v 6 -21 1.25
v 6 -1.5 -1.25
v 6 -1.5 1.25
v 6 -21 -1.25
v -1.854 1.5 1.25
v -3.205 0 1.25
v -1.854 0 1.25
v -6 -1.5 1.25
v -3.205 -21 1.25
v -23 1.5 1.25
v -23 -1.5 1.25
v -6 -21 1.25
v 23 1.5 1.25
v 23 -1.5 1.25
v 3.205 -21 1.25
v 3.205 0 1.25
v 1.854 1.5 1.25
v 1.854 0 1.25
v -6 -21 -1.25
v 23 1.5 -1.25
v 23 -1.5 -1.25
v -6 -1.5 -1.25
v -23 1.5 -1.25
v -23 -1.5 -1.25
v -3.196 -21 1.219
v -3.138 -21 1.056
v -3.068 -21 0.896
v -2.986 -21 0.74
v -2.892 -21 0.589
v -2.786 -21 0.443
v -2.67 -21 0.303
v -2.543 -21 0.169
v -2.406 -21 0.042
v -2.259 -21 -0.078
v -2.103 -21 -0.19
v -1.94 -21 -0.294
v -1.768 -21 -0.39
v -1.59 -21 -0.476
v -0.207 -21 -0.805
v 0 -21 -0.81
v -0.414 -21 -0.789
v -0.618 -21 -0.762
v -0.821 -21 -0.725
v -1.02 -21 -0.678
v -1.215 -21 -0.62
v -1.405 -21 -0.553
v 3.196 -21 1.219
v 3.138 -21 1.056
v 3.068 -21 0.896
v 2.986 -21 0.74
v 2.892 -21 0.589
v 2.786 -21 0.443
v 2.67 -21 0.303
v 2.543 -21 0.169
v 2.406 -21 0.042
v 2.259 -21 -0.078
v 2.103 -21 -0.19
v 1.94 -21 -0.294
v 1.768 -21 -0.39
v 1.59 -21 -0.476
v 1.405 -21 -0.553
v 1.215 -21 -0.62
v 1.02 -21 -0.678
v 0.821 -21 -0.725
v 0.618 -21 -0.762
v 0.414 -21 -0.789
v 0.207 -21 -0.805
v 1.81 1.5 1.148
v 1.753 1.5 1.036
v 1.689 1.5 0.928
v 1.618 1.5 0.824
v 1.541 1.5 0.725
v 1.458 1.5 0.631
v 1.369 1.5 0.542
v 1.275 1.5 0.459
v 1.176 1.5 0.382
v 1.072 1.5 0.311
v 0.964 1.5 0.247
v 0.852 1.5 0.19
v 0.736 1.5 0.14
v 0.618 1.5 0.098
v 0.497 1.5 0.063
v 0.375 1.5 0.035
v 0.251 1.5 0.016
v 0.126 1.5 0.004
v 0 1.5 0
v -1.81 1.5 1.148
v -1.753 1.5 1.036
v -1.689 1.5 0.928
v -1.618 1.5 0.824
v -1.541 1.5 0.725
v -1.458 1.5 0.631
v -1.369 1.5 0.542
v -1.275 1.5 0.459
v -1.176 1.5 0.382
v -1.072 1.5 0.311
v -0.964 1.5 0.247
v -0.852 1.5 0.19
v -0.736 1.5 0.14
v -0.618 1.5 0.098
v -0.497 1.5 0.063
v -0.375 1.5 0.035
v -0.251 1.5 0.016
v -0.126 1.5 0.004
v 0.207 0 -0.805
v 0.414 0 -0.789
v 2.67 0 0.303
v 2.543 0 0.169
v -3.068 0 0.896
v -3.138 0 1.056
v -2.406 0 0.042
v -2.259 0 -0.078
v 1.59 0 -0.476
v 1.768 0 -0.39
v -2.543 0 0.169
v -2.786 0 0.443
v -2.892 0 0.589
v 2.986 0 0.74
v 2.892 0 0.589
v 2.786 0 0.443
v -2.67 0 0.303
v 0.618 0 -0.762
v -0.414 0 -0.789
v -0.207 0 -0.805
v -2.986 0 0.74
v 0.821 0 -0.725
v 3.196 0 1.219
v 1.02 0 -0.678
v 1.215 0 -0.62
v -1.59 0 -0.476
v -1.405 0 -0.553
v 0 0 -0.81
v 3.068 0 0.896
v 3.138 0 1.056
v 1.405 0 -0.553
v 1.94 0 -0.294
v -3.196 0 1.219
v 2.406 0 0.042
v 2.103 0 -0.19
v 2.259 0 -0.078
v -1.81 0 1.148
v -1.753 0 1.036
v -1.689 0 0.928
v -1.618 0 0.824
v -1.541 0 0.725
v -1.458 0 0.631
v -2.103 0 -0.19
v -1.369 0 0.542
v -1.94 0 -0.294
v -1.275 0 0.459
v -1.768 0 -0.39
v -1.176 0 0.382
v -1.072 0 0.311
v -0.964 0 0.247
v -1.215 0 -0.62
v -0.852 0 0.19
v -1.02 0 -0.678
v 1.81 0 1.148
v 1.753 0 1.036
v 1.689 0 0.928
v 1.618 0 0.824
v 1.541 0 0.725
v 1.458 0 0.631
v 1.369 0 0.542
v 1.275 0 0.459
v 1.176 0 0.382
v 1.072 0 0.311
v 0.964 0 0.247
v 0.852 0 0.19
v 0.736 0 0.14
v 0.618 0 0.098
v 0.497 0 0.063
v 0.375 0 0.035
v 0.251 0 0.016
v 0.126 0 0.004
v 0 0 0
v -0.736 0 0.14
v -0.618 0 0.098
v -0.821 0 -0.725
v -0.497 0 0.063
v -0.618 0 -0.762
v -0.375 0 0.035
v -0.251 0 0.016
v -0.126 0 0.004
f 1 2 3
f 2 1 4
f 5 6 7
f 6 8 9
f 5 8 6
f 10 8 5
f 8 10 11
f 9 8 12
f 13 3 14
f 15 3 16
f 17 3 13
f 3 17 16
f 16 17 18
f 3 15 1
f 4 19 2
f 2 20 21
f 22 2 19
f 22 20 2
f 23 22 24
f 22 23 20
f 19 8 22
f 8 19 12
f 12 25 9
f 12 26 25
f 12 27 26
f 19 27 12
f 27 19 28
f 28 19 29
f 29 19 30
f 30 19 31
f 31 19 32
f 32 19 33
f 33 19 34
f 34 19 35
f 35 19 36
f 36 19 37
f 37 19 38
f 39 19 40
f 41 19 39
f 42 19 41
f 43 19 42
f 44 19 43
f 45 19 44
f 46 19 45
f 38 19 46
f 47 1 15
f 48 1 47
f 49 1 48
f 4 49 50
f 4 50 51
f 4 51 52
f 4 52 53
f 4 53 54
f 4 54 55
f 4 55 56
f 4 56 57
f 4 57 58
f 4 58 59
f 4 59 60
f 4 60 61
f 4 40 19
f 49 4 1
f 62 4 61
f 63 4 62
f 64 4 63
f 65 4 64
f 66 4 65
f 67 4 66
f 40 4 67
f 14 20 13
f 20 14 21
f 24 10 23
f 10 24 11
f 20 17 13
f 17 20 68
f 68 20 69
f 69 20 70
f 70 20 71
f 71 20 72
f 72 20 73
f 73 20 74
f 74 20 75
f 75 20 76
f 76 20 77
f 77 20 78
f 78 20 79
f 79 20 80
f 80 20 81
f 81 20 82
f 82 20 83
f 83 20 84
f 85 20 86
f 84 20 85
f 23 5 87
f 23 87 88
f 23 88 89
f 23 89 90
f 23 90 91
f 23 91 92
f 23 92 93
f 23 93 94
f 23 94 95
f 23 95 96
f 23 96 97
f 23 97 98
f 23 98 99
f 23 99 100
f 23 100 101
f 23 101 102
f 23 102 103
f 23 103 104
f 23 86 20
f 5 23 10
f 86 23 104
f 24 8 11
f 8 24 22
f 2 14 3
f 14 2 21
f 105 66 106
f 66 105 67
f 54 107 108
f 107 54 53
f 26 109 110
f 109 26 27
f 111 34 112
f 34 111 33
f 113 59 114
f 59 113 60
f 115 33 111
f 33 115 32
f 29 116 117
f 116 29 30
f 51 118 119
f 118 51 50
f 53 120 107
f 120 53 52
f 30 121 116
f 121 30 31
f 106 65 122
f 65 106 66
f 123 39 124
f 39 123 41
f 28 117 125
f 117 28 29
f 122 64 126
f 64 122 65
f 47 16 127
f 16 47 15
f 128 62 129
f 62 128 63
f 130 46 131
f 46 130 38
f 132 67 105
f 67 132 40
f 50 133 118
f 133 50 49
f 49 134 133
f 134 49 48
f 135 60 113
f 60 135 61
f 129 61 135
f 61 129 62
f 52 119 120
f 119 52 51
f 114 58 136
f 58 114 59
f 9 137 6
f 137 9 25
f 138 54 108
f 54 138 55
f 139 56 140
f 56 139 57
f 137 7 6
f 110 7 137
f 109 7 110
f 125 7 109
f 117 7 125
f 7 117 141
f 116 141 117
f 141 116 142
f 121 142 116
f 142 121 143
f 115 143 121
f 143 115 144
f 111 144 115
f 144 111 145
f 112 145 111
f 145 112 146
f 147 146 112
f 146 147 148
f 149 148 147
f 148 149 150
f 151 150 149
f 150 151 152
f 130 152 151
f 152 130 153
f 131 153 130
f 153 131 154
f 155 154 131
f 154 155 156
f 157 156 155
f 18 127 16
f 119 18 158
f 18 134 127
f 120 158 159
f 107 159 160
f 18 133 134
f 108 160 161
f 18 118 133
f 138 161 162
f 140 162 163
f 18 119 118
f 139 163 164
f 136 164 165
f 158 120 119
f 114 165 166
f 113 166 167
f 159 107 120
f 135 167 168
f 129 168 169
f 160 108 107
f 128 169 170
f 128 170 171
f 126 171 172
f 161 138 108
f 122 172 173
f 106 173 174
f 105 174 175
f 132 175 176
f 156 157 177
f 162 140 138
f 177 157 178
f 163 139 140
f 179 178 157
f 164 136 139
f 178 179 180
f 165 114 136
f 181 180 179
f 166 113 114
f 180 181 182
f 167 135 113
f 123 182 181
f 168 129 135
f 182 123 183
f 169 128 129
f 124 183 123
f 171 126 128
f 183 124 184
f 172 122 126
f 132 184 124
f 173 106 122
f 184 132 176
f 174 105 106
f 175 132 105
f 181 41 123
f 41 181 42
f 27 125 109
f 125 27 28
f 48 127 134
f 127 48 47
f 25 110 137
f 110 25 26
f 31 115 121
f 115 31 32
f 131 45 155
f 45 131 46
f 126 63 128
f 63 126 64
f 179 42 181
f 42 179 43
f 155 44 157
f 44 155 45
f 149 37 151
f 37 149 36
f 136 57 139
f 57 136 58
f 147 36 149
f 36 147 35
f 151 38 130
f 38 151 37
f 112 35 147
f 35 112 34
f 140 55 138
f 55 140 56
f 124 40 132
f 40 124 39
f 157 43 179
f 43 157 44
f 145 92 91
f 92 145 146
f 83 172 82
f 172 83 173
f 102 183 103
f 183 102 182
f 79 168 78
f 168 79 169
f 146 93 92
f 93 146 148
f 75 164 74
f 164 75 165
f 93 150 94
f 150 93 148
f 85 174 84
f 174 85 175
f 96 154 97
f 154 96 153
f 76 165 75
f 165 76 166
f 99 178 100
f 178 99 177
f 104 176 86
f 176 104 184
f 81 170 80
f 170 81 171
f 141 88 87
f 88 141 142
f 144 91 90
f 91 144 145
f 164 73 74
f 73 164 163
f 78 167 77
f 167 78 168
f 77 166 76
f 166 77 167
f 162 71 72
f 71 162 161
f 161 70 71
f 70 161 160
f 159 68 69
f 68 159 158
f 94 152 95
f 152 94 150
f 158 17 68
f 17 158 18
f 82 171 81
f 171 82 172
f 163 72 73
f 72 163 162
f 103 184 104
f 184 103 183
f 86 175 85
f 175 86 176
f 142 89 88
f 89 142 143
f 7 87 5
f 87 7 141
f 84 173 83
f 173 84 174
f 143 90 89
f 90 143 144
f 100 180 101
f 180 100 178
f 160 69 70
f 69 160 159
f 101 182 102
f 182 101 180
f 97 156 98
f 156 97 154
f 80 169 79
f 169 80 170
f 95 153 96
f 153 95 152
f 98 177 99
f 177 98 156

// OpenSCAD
// frame for home cage alcohol self-administration. 
// Hao Chen
// UTHSC
// Creative Commoons Attribution NonCommercial  

$fn=100;
max_w=210;
max_h=138;
max_d=90;

pw=40;// spout holder width x 
ph=45;// spout holder length y
pg=60;// spout holder height z
//r=10;
fv=0.1; // for better visualization

module corner(ln=20, wd=30 ){ // a negative part for making a round corner 
	difference (){
		cube([wd,wd,ln]);
		translate([0,0,0])
		cylinder(r=wd, h=ln);
	}
}

module outbox(){ // outside box for the frame
	corner_wd=10;
	corner_ln=max_d;
	difference(){
		cube([max_w-fv,max_d-fv,max_h-fv],center=true);
		union(){
			translate([max_w/2-corner_wd, max_d/2, -max_h/2+corner_wd]) rotate([90,90,0]) corner(ln=corner_ln, wd=corner_wd);
			translate([-max_w/2+corner_wd, max_d/2, -max_h/2+corner_wd]) rotate([90,180,0]) corner(ln=corner_ln, wd=corner_wd);
		}
	}
}

module innerbox(){ // inside box for the frame
	inn_w=max_w-10;
	inn_h=max_h-20;
	inn_d=max_d;
	corner_wd=20;
	corner_ln=max_d;
	difference(){
		cube([inn_w-fv,inn_d-fv,inn_h-fv],center=true);
		union(){
			translate([inn_w/2-corner_wd, inn_d/2, -inn_h/2+corner_wd]) rotate([90,90,0]) corner(ln=corner_ln, wd=corner_wd);
			translate([-inn_w/2+corner_wd, inn_d/2, -inn_h/2+corner_wd]) rotate([90,180,0]) corner(ln=corner_ln, wd=corner_wd);
		}
	}
}

module frame(){
	difference () {
		outbox();
		translate([0,4,-max_h/2]) cube([max_w-20,max_d-7,max_h/2], center=true);
		translate([0,7,-8]) innerbox();
	}
}

module mounting_m25(innR=1.9){ // screw 
	difference(){
		cylinder(r=3.8, h=5);
		cylinder(r=innR, h=5+fv);
	}
}

module mounting_pi(){
	mounting_m25();
	translate([58,0,0]) mounting_m25();
	translate([0,49,0]) mounting_m25();
	translate([58,49,0]) mounting_m25();
} 

module mounting_touch(){
	mounting_m25(innR=1.2);
	translate([28,0,0]) mounting_m25(innR=1.2);
} 

module mounting_RTC(){
	mounting_m25();
	difference(){
		union(){
			translate([22.5,0,0]) cylinder(r=3.8, h=5);
			translate([24.5,0,0]) cylinder(r=3.8, h=5) ;
		}
		translate([22.5,0,0]) cylinder(r=1.2, h=10);
		translate([24.5,0,0]) cylinder(r=1.2, h=10); 
	}
}

module mounting_screws(){
	translate([-92,-17, max_h/2-2]) mounting_pi();
	translate([8,-16, max_h/2-2]) mounting_touch();
	translate([20,33, max_h/2-2]) mounting_RTC();
	translate([70,-20, max_h/2+2]) rotate([0,0,0])  step_motor_control();
}



module top_groove(){ // for the top cover
	xw=max_w-5;
	xd=max_d-5;
	difference(){
		union (){
	//		translate([xw/2-.5, xd/2-.5,-5]) corner2();
	//		translate([-xw/2+0.5, -xd/2+0.5,-5]) corner2() ;
	//		translate([-xw/2+0.5, xd/2-0.5,-5]) corner2() ;
	//		translate([xw/2-0.5, -xd/2+0.5,-5]) corner2() ;
			cube([xw, xd, 10], center=true);
		}
		translate([0,0, -5.6])round_corner_box(r0=5, wd=max_w-24, lg=max_d-24,ht=11);
	}
}

//module corner2(){
	//rotate([0,0,45]) scale([0.7,1,1]) cylinder(r=1.5	,h=10);
//	 cylinder(r=1.5	,h=10);
//}

module lcd(){ // model:  HD44780 
	translate([0,0, 13.1]) cube([71.5, 24.5, 8.4], center=true);
	//translate([0,0, 13.1-3.7]) cube([80.6, 36, 0.1], center=true); // base plate
}

module lcd_screw(){
	difference(){
	cylinder(r=3.4, h=10);
	cylinder(r=1.3,, h=10);
	}
}


module lcd_mounting(){
	w=75;
	l=31;
	translate([w/2,   l/2,0])lcd_screw();
	translate([w/2,  -l/2,0])lcd_screw();
	translate([-w/2, -l/2,0])lcd_screw();
	translate([-w/2,  l/2,0])lcd_screw();
}

module rfid_antenna_holder(){
	difference(){
		cube([10,20,19], center=true);
		translate([1,0,5]) cube([8,22,19], center=true);
	}
}

module top_cover(){
	lcdx=-40;
	lcdy=17;
	lcdz1=51;
	lcdz2=43;
	ctlx=30;
	ctly=41;
	ctlz=20;
   union(){
		translate([-105,22,48.5]) rfid_antenna_holder(); //box on side to hold antennae
		difference(){  
			translate([0,40,0]) rotate([90,0,270]) slant_box(); //outside
			difference() {
				translate([0,38,-2]) rotate([90,0,270]) scale([0.95, 1, 0.98]) slant_box(); //inside    
				translate([ctlx,ctly,ctlz]) rotate([90,0,0]) drill(); // for controlPanel
				translate([lcdx,lcdy,lcdz1]) lcd_mounting();
		}
		translate([-130,0,4]) rotate([0,90,0]) cylinder(r=1.9, h=240); //screw hole for the top cover on the side;
		//translate([max_w/2-10,0,16]) rotate([90,0,90]) round_corner_box(r0=1, wd=28,lg=2.5, ht=20); // sd card slot for old base
		translate([max_w/2-10,-5,11]) rotate([90,0,90]) round_corner_box(r0=1, wd=14.5,lg=2.5, ht=20); // sd card slot for updated base
		translate([5,max_d/2,6]) rotate([90,0,0]) round_corner_box(r0=1, wd=30,lg=10, ht=15); // new, longer wire exits 
		translate([-max_w/2+5,-14,-1]) round_corner_box(r0=0.5, wd=5,lg=1, ht=10); // side exit for antennae
		translate([ctlx,ctly,ctlz]) rotate([90,0,0]) controlPanel();
		translate([lcdx,lcdy,lcdz2]) rotate([0,0,0]) lcd();
//#		translate([lcdx,lcdy,lcdz2]) rotate([0,0,0]) lcd_mounting_neg();
		}
	}
}

module slant_box() {
	linear_extrude(height=max_w-8,center=true) polygon(points=[[0,0],[0,58],[55,58],[max_d-9,29],[max_d-9,0]]);
}

module switch() { //holes for the switch buttons
    translate([11,23,0]) cube([8,7,7]);
    translate([29,23,0]) cube([8,7,7]);
}

module led() { // hole for the LED lights
   translate([19,0,0]) cube([10,5,7]);
}

module column(){
 	cylinder(2.5,4,4);
} //the inside column

module drill() {//all four inside columns
    translate([4,4,2.23]) column();
    translate([44,4,2.23]) column();
    translate([4,26,2.23]) column();
    translate([44,26,2.23]) column();
}

module hollow() {
	cylinder(9.1,1.5,1.5);
} //the screw holes

module drillholes() {//all four screw holes for switches board
	//translate([4,4,0]) hollow();
    //translate([44,4,0]) hollow();
   	translate([4,26,0]) hollow();
   	translate([44,26,0]) hollow();
}
module controlPanel() {  //holes for the screws, LED, and buttons
	union() {
		switch();
		led();
		drillholes();
	}
}


module round_corner_box( r0=10, wd=20, ht=30, lg=40) { // generic 
	hull(){
	translate([wd/2,lg/2,0])
	cylinder(r=r0, h=ht);
	translate([wd/2,-lg/2,0]) cylinder(r=r0, h=ht);
	translate([-wd/2,-lg/2,0]) cylinder(r=r0,h=ht);
	translate([-wd/2,lg/2,0]) cylinder(r=r0, h=ht);
	}
}

module step_motor_control(){
	difference(){
		cube([22+20, 17+4, 5],center=true);
		union(){
			translate([15,0,-3]) cylinder(r=1.5, h=8);
			translate([-15,0,-3]) cylinder(r=1.5, h=8);
			cube([22, 17, 9], center=true);
		}
	}

} 

module step_motor_fastener (){
	difference(){
		cube([13, 9, 3],center=true);
		translate([4,0,-3]) cylinder(r=1.7, h=8);
	}
}

module motion_sensor (){
	translate([-14,0,5]) cylinder(r=1, h=7);
	translate([14,0,5]) cylinder(r=1,h=7);
	cylinder(r=4.5, h=20);
	cylinder(r1=20,r2=4.5, h=6);
}

module spout_holder_inner (sh_x=70, sh_y=40){
	difference() {
	translate([-sh_x,-sh_y+10,15]) rotate([90,0,0]) round_corner_box(r0=3,wd=pw-6, ht=ph+5,lg=pg-14); // spout holder inside
	translate([-sh_x,-sh_y-10,-28]) rotate([80,0,0]) cube([pw+2, ph, pg+10], center=true); // spout holder inside
	}
}

module spout_holder(sh_x=70, sh_y=40, sh_z=20){
	//sh_x: spout holder x
	//sh_y: spout holder y
	//sh_z: spout holder z
	difference(){
		union(){
			translate([-sh_x,-sh_y,sh_z]) rotate([90,0,0]) round_corner_box(r0=3,wd=pw, ht=ph,lg=pg); //spout holder outside
			translate([-sh_x,-sh_y,sh_z-pg/2-6]) rotate([90,0,0]) round_corner_box(r0=2,ht=5,wd=13,lg=8); //positive for attachment screw, bottom 
			translate([-sh_x,-sh_y,sh_z+pg/2+6]) rotate([90,0,0]) round_corner_box(r0=2,ht=5,wd=13,lg=8); //positive for attachment screw, top
		}
		union(){
			spout_holder_inner();
			translate([-sh_x-30,-sh_y-10,sh_z]) rotate([0,90,0]) cylinder(r=2.5, h=55); //holes for alignment of the spout tip 
			translate([-sh_x,-sh_y-10,sh_z+18]) rotate([25,0,0]) union(){
				cylinder(r=2.75, h=18); //hole for cue LED 
				cylinder(r1=5, r2=2.75, h=5); //hole for cue LED 
			}
			translate([-sh_x,-sh_y,sh_z]) rotate([90,0,0]) cylinder(r=10, h=50); //holes for obverving the rat 
			translate([-sh_x,-sh_y-10,sh_z]) rotate([35,0,0]) cylinder(r=4.6, h=55); // location of the spout 
			translate([-sh_x,-sh_y-42, sh_z+31]) rotate([-55, 0,0]) cube([8.4, 18, 4.1], center=true);// hex screw for spout 
			translate([-sh_x,-sh_y-60,sh_z+14]) rotate([-55,0,0]) cylinder(r=1.9, h=50); //screw hole for tightening the spout 
			translate([-sh_x,-sh_y-10,sh_z-pg/2-7]) rotate([-90,0,0]) cylinder(r=1.9, h=25); //negative for attachment screw, top
			translate([-sh_x,-sh_y-10,sh_z+pg/2+7]) rotate([-90,0,0]) cylinder(r=1.9, h=25); //negative for attachment screw, top
			translate([-54,-50,55])	cylinder(r=1.5,h=10,center=true); // screw for led cue light wire fastner
		}
	}
}


module rfid_antenna_housing() //to hold RFID antennae
	{
	difference(){
	cube([53,40,6], center=true); // rfid antenna outside;
	translate([0,-6,0]) cube([47,46,3], center=true); // rfid antenna groove;
	cube([36,25,15], center=true); //rfid antenna loop inside  
	}
}

module rfid_door() {// to close teh RFID antennae housing
	difference(){
		union(){
			translate([0,-11,0]) cube([12,20,2.5], center=true) ;
			cube([46,3,2.5], center=true); // rfid antenna groove;
		}
		scale([1.1,1,0.9])translate([0,-13,2.1]) rotate([90,0,0]) cylinder (r=3, h=26, center=true);
		translate([0,-9,2]) rotate([90,0,0]) cylinder (r=2, h=26, center=true);
	}
}

module the_thing (){
	difference(){
		union(){
			difference(){
				//	pw=40;// spout holder width x 
				//	ph=40;// spout holder length y
				//	pg=50;// spout holder height z
				frame();
				union(){
					translate([0,0,max_h/2-4]) top_groove();
					rotate([90,0,0]) translate([0,0,34]) motion_sensor();
					translate([-max_w/2,0,65]) rotate([0,90,0]) cylinder(r=1.9, h=10); //screw hole for the top cover on the side;
					translate([max_w/2-10,0,65]) rotate([0,90,0]) cylinder(r=1.9, h=10); //screw hole for the top cover on the side; 
					spout_holder_inner(sh_x=-70);
					spout_holder_inner(sh_x=70);
					spout_holder(sh_x=70, sh_y=44.7, sh_z=20);
					spout_holder(sh_x=-70, sh_y=44.7, sh_z=20);
					//mounting holes for the spout holders
					translate([-70,-45,20-pg/2-7]) rotate([-90,0,0]) cylinder(r=1.7, h=7);
					translate([70,-45,20-pg/2-7]) rotate([-90,0,0]) cylinder(r=1.7, h=7); 
					translate([-70,-45,20+pg/2+7]) rotate([-90,0,0]) cylinder(r=1.7, h=7);
					translate([70,-45,20+pg/2+7]) rotate([-90,0,0]) cylinder(r=1.7, h=7); 
				}
			}
			mounting_screws();
			translate([70,0,70]) difference(){
				cube([42,22,7],center=true);
				cube([23,18,9.1],center=true); //voltage converter housing
				translate([15,0,0]) cylinder(r=1.5, h=8);
				translate([-15,0,0]) cylinder(r=1.5, h=8);
			}
		}
		translate([78,33,67]) cube([11.5,3,5],center=true); // rfid board connection via the pins in groove; 
	}
}
        

module cue_light_wires () {
	difference () {
		cube([16, 9,5], center=true);
		rotate ([90,0,10]) scale([1,2.6,1])  union () { // wires track
			translate([4.5,1.7,0])cylinder (r=2, h=20,center=true);
			translate([-4.5,1.7,0])cylinder (r=2, h=20,center=true);
		}
		cylinder(r=1.7,h=10,center=true); // screw
	}
}

module lower_half () {
	difference() { 
		the_thing(); 
		translate([0,0,65]) cube([212,120,30],center=true);
	} 
}

module top_half(){
	translate([0,0,30]) difference(){ 
		the_thing(); 
		translate([0,0,-15]) cube([212,120,132],center=true);
	}
}

//rfid_antenna_housing();
rfid_door();
//top_half();
//lower_half();
//rotate([0,0,180]) translate([0,0,90]) top_cover();
//translate([-54,-50,55])rotate([180,0,90])color("blue")cue_light_wires();
//spout_holder(sh_x=70, sh_y=40, sh_z=20);
//the_thing();
//step_motor_fastener();
